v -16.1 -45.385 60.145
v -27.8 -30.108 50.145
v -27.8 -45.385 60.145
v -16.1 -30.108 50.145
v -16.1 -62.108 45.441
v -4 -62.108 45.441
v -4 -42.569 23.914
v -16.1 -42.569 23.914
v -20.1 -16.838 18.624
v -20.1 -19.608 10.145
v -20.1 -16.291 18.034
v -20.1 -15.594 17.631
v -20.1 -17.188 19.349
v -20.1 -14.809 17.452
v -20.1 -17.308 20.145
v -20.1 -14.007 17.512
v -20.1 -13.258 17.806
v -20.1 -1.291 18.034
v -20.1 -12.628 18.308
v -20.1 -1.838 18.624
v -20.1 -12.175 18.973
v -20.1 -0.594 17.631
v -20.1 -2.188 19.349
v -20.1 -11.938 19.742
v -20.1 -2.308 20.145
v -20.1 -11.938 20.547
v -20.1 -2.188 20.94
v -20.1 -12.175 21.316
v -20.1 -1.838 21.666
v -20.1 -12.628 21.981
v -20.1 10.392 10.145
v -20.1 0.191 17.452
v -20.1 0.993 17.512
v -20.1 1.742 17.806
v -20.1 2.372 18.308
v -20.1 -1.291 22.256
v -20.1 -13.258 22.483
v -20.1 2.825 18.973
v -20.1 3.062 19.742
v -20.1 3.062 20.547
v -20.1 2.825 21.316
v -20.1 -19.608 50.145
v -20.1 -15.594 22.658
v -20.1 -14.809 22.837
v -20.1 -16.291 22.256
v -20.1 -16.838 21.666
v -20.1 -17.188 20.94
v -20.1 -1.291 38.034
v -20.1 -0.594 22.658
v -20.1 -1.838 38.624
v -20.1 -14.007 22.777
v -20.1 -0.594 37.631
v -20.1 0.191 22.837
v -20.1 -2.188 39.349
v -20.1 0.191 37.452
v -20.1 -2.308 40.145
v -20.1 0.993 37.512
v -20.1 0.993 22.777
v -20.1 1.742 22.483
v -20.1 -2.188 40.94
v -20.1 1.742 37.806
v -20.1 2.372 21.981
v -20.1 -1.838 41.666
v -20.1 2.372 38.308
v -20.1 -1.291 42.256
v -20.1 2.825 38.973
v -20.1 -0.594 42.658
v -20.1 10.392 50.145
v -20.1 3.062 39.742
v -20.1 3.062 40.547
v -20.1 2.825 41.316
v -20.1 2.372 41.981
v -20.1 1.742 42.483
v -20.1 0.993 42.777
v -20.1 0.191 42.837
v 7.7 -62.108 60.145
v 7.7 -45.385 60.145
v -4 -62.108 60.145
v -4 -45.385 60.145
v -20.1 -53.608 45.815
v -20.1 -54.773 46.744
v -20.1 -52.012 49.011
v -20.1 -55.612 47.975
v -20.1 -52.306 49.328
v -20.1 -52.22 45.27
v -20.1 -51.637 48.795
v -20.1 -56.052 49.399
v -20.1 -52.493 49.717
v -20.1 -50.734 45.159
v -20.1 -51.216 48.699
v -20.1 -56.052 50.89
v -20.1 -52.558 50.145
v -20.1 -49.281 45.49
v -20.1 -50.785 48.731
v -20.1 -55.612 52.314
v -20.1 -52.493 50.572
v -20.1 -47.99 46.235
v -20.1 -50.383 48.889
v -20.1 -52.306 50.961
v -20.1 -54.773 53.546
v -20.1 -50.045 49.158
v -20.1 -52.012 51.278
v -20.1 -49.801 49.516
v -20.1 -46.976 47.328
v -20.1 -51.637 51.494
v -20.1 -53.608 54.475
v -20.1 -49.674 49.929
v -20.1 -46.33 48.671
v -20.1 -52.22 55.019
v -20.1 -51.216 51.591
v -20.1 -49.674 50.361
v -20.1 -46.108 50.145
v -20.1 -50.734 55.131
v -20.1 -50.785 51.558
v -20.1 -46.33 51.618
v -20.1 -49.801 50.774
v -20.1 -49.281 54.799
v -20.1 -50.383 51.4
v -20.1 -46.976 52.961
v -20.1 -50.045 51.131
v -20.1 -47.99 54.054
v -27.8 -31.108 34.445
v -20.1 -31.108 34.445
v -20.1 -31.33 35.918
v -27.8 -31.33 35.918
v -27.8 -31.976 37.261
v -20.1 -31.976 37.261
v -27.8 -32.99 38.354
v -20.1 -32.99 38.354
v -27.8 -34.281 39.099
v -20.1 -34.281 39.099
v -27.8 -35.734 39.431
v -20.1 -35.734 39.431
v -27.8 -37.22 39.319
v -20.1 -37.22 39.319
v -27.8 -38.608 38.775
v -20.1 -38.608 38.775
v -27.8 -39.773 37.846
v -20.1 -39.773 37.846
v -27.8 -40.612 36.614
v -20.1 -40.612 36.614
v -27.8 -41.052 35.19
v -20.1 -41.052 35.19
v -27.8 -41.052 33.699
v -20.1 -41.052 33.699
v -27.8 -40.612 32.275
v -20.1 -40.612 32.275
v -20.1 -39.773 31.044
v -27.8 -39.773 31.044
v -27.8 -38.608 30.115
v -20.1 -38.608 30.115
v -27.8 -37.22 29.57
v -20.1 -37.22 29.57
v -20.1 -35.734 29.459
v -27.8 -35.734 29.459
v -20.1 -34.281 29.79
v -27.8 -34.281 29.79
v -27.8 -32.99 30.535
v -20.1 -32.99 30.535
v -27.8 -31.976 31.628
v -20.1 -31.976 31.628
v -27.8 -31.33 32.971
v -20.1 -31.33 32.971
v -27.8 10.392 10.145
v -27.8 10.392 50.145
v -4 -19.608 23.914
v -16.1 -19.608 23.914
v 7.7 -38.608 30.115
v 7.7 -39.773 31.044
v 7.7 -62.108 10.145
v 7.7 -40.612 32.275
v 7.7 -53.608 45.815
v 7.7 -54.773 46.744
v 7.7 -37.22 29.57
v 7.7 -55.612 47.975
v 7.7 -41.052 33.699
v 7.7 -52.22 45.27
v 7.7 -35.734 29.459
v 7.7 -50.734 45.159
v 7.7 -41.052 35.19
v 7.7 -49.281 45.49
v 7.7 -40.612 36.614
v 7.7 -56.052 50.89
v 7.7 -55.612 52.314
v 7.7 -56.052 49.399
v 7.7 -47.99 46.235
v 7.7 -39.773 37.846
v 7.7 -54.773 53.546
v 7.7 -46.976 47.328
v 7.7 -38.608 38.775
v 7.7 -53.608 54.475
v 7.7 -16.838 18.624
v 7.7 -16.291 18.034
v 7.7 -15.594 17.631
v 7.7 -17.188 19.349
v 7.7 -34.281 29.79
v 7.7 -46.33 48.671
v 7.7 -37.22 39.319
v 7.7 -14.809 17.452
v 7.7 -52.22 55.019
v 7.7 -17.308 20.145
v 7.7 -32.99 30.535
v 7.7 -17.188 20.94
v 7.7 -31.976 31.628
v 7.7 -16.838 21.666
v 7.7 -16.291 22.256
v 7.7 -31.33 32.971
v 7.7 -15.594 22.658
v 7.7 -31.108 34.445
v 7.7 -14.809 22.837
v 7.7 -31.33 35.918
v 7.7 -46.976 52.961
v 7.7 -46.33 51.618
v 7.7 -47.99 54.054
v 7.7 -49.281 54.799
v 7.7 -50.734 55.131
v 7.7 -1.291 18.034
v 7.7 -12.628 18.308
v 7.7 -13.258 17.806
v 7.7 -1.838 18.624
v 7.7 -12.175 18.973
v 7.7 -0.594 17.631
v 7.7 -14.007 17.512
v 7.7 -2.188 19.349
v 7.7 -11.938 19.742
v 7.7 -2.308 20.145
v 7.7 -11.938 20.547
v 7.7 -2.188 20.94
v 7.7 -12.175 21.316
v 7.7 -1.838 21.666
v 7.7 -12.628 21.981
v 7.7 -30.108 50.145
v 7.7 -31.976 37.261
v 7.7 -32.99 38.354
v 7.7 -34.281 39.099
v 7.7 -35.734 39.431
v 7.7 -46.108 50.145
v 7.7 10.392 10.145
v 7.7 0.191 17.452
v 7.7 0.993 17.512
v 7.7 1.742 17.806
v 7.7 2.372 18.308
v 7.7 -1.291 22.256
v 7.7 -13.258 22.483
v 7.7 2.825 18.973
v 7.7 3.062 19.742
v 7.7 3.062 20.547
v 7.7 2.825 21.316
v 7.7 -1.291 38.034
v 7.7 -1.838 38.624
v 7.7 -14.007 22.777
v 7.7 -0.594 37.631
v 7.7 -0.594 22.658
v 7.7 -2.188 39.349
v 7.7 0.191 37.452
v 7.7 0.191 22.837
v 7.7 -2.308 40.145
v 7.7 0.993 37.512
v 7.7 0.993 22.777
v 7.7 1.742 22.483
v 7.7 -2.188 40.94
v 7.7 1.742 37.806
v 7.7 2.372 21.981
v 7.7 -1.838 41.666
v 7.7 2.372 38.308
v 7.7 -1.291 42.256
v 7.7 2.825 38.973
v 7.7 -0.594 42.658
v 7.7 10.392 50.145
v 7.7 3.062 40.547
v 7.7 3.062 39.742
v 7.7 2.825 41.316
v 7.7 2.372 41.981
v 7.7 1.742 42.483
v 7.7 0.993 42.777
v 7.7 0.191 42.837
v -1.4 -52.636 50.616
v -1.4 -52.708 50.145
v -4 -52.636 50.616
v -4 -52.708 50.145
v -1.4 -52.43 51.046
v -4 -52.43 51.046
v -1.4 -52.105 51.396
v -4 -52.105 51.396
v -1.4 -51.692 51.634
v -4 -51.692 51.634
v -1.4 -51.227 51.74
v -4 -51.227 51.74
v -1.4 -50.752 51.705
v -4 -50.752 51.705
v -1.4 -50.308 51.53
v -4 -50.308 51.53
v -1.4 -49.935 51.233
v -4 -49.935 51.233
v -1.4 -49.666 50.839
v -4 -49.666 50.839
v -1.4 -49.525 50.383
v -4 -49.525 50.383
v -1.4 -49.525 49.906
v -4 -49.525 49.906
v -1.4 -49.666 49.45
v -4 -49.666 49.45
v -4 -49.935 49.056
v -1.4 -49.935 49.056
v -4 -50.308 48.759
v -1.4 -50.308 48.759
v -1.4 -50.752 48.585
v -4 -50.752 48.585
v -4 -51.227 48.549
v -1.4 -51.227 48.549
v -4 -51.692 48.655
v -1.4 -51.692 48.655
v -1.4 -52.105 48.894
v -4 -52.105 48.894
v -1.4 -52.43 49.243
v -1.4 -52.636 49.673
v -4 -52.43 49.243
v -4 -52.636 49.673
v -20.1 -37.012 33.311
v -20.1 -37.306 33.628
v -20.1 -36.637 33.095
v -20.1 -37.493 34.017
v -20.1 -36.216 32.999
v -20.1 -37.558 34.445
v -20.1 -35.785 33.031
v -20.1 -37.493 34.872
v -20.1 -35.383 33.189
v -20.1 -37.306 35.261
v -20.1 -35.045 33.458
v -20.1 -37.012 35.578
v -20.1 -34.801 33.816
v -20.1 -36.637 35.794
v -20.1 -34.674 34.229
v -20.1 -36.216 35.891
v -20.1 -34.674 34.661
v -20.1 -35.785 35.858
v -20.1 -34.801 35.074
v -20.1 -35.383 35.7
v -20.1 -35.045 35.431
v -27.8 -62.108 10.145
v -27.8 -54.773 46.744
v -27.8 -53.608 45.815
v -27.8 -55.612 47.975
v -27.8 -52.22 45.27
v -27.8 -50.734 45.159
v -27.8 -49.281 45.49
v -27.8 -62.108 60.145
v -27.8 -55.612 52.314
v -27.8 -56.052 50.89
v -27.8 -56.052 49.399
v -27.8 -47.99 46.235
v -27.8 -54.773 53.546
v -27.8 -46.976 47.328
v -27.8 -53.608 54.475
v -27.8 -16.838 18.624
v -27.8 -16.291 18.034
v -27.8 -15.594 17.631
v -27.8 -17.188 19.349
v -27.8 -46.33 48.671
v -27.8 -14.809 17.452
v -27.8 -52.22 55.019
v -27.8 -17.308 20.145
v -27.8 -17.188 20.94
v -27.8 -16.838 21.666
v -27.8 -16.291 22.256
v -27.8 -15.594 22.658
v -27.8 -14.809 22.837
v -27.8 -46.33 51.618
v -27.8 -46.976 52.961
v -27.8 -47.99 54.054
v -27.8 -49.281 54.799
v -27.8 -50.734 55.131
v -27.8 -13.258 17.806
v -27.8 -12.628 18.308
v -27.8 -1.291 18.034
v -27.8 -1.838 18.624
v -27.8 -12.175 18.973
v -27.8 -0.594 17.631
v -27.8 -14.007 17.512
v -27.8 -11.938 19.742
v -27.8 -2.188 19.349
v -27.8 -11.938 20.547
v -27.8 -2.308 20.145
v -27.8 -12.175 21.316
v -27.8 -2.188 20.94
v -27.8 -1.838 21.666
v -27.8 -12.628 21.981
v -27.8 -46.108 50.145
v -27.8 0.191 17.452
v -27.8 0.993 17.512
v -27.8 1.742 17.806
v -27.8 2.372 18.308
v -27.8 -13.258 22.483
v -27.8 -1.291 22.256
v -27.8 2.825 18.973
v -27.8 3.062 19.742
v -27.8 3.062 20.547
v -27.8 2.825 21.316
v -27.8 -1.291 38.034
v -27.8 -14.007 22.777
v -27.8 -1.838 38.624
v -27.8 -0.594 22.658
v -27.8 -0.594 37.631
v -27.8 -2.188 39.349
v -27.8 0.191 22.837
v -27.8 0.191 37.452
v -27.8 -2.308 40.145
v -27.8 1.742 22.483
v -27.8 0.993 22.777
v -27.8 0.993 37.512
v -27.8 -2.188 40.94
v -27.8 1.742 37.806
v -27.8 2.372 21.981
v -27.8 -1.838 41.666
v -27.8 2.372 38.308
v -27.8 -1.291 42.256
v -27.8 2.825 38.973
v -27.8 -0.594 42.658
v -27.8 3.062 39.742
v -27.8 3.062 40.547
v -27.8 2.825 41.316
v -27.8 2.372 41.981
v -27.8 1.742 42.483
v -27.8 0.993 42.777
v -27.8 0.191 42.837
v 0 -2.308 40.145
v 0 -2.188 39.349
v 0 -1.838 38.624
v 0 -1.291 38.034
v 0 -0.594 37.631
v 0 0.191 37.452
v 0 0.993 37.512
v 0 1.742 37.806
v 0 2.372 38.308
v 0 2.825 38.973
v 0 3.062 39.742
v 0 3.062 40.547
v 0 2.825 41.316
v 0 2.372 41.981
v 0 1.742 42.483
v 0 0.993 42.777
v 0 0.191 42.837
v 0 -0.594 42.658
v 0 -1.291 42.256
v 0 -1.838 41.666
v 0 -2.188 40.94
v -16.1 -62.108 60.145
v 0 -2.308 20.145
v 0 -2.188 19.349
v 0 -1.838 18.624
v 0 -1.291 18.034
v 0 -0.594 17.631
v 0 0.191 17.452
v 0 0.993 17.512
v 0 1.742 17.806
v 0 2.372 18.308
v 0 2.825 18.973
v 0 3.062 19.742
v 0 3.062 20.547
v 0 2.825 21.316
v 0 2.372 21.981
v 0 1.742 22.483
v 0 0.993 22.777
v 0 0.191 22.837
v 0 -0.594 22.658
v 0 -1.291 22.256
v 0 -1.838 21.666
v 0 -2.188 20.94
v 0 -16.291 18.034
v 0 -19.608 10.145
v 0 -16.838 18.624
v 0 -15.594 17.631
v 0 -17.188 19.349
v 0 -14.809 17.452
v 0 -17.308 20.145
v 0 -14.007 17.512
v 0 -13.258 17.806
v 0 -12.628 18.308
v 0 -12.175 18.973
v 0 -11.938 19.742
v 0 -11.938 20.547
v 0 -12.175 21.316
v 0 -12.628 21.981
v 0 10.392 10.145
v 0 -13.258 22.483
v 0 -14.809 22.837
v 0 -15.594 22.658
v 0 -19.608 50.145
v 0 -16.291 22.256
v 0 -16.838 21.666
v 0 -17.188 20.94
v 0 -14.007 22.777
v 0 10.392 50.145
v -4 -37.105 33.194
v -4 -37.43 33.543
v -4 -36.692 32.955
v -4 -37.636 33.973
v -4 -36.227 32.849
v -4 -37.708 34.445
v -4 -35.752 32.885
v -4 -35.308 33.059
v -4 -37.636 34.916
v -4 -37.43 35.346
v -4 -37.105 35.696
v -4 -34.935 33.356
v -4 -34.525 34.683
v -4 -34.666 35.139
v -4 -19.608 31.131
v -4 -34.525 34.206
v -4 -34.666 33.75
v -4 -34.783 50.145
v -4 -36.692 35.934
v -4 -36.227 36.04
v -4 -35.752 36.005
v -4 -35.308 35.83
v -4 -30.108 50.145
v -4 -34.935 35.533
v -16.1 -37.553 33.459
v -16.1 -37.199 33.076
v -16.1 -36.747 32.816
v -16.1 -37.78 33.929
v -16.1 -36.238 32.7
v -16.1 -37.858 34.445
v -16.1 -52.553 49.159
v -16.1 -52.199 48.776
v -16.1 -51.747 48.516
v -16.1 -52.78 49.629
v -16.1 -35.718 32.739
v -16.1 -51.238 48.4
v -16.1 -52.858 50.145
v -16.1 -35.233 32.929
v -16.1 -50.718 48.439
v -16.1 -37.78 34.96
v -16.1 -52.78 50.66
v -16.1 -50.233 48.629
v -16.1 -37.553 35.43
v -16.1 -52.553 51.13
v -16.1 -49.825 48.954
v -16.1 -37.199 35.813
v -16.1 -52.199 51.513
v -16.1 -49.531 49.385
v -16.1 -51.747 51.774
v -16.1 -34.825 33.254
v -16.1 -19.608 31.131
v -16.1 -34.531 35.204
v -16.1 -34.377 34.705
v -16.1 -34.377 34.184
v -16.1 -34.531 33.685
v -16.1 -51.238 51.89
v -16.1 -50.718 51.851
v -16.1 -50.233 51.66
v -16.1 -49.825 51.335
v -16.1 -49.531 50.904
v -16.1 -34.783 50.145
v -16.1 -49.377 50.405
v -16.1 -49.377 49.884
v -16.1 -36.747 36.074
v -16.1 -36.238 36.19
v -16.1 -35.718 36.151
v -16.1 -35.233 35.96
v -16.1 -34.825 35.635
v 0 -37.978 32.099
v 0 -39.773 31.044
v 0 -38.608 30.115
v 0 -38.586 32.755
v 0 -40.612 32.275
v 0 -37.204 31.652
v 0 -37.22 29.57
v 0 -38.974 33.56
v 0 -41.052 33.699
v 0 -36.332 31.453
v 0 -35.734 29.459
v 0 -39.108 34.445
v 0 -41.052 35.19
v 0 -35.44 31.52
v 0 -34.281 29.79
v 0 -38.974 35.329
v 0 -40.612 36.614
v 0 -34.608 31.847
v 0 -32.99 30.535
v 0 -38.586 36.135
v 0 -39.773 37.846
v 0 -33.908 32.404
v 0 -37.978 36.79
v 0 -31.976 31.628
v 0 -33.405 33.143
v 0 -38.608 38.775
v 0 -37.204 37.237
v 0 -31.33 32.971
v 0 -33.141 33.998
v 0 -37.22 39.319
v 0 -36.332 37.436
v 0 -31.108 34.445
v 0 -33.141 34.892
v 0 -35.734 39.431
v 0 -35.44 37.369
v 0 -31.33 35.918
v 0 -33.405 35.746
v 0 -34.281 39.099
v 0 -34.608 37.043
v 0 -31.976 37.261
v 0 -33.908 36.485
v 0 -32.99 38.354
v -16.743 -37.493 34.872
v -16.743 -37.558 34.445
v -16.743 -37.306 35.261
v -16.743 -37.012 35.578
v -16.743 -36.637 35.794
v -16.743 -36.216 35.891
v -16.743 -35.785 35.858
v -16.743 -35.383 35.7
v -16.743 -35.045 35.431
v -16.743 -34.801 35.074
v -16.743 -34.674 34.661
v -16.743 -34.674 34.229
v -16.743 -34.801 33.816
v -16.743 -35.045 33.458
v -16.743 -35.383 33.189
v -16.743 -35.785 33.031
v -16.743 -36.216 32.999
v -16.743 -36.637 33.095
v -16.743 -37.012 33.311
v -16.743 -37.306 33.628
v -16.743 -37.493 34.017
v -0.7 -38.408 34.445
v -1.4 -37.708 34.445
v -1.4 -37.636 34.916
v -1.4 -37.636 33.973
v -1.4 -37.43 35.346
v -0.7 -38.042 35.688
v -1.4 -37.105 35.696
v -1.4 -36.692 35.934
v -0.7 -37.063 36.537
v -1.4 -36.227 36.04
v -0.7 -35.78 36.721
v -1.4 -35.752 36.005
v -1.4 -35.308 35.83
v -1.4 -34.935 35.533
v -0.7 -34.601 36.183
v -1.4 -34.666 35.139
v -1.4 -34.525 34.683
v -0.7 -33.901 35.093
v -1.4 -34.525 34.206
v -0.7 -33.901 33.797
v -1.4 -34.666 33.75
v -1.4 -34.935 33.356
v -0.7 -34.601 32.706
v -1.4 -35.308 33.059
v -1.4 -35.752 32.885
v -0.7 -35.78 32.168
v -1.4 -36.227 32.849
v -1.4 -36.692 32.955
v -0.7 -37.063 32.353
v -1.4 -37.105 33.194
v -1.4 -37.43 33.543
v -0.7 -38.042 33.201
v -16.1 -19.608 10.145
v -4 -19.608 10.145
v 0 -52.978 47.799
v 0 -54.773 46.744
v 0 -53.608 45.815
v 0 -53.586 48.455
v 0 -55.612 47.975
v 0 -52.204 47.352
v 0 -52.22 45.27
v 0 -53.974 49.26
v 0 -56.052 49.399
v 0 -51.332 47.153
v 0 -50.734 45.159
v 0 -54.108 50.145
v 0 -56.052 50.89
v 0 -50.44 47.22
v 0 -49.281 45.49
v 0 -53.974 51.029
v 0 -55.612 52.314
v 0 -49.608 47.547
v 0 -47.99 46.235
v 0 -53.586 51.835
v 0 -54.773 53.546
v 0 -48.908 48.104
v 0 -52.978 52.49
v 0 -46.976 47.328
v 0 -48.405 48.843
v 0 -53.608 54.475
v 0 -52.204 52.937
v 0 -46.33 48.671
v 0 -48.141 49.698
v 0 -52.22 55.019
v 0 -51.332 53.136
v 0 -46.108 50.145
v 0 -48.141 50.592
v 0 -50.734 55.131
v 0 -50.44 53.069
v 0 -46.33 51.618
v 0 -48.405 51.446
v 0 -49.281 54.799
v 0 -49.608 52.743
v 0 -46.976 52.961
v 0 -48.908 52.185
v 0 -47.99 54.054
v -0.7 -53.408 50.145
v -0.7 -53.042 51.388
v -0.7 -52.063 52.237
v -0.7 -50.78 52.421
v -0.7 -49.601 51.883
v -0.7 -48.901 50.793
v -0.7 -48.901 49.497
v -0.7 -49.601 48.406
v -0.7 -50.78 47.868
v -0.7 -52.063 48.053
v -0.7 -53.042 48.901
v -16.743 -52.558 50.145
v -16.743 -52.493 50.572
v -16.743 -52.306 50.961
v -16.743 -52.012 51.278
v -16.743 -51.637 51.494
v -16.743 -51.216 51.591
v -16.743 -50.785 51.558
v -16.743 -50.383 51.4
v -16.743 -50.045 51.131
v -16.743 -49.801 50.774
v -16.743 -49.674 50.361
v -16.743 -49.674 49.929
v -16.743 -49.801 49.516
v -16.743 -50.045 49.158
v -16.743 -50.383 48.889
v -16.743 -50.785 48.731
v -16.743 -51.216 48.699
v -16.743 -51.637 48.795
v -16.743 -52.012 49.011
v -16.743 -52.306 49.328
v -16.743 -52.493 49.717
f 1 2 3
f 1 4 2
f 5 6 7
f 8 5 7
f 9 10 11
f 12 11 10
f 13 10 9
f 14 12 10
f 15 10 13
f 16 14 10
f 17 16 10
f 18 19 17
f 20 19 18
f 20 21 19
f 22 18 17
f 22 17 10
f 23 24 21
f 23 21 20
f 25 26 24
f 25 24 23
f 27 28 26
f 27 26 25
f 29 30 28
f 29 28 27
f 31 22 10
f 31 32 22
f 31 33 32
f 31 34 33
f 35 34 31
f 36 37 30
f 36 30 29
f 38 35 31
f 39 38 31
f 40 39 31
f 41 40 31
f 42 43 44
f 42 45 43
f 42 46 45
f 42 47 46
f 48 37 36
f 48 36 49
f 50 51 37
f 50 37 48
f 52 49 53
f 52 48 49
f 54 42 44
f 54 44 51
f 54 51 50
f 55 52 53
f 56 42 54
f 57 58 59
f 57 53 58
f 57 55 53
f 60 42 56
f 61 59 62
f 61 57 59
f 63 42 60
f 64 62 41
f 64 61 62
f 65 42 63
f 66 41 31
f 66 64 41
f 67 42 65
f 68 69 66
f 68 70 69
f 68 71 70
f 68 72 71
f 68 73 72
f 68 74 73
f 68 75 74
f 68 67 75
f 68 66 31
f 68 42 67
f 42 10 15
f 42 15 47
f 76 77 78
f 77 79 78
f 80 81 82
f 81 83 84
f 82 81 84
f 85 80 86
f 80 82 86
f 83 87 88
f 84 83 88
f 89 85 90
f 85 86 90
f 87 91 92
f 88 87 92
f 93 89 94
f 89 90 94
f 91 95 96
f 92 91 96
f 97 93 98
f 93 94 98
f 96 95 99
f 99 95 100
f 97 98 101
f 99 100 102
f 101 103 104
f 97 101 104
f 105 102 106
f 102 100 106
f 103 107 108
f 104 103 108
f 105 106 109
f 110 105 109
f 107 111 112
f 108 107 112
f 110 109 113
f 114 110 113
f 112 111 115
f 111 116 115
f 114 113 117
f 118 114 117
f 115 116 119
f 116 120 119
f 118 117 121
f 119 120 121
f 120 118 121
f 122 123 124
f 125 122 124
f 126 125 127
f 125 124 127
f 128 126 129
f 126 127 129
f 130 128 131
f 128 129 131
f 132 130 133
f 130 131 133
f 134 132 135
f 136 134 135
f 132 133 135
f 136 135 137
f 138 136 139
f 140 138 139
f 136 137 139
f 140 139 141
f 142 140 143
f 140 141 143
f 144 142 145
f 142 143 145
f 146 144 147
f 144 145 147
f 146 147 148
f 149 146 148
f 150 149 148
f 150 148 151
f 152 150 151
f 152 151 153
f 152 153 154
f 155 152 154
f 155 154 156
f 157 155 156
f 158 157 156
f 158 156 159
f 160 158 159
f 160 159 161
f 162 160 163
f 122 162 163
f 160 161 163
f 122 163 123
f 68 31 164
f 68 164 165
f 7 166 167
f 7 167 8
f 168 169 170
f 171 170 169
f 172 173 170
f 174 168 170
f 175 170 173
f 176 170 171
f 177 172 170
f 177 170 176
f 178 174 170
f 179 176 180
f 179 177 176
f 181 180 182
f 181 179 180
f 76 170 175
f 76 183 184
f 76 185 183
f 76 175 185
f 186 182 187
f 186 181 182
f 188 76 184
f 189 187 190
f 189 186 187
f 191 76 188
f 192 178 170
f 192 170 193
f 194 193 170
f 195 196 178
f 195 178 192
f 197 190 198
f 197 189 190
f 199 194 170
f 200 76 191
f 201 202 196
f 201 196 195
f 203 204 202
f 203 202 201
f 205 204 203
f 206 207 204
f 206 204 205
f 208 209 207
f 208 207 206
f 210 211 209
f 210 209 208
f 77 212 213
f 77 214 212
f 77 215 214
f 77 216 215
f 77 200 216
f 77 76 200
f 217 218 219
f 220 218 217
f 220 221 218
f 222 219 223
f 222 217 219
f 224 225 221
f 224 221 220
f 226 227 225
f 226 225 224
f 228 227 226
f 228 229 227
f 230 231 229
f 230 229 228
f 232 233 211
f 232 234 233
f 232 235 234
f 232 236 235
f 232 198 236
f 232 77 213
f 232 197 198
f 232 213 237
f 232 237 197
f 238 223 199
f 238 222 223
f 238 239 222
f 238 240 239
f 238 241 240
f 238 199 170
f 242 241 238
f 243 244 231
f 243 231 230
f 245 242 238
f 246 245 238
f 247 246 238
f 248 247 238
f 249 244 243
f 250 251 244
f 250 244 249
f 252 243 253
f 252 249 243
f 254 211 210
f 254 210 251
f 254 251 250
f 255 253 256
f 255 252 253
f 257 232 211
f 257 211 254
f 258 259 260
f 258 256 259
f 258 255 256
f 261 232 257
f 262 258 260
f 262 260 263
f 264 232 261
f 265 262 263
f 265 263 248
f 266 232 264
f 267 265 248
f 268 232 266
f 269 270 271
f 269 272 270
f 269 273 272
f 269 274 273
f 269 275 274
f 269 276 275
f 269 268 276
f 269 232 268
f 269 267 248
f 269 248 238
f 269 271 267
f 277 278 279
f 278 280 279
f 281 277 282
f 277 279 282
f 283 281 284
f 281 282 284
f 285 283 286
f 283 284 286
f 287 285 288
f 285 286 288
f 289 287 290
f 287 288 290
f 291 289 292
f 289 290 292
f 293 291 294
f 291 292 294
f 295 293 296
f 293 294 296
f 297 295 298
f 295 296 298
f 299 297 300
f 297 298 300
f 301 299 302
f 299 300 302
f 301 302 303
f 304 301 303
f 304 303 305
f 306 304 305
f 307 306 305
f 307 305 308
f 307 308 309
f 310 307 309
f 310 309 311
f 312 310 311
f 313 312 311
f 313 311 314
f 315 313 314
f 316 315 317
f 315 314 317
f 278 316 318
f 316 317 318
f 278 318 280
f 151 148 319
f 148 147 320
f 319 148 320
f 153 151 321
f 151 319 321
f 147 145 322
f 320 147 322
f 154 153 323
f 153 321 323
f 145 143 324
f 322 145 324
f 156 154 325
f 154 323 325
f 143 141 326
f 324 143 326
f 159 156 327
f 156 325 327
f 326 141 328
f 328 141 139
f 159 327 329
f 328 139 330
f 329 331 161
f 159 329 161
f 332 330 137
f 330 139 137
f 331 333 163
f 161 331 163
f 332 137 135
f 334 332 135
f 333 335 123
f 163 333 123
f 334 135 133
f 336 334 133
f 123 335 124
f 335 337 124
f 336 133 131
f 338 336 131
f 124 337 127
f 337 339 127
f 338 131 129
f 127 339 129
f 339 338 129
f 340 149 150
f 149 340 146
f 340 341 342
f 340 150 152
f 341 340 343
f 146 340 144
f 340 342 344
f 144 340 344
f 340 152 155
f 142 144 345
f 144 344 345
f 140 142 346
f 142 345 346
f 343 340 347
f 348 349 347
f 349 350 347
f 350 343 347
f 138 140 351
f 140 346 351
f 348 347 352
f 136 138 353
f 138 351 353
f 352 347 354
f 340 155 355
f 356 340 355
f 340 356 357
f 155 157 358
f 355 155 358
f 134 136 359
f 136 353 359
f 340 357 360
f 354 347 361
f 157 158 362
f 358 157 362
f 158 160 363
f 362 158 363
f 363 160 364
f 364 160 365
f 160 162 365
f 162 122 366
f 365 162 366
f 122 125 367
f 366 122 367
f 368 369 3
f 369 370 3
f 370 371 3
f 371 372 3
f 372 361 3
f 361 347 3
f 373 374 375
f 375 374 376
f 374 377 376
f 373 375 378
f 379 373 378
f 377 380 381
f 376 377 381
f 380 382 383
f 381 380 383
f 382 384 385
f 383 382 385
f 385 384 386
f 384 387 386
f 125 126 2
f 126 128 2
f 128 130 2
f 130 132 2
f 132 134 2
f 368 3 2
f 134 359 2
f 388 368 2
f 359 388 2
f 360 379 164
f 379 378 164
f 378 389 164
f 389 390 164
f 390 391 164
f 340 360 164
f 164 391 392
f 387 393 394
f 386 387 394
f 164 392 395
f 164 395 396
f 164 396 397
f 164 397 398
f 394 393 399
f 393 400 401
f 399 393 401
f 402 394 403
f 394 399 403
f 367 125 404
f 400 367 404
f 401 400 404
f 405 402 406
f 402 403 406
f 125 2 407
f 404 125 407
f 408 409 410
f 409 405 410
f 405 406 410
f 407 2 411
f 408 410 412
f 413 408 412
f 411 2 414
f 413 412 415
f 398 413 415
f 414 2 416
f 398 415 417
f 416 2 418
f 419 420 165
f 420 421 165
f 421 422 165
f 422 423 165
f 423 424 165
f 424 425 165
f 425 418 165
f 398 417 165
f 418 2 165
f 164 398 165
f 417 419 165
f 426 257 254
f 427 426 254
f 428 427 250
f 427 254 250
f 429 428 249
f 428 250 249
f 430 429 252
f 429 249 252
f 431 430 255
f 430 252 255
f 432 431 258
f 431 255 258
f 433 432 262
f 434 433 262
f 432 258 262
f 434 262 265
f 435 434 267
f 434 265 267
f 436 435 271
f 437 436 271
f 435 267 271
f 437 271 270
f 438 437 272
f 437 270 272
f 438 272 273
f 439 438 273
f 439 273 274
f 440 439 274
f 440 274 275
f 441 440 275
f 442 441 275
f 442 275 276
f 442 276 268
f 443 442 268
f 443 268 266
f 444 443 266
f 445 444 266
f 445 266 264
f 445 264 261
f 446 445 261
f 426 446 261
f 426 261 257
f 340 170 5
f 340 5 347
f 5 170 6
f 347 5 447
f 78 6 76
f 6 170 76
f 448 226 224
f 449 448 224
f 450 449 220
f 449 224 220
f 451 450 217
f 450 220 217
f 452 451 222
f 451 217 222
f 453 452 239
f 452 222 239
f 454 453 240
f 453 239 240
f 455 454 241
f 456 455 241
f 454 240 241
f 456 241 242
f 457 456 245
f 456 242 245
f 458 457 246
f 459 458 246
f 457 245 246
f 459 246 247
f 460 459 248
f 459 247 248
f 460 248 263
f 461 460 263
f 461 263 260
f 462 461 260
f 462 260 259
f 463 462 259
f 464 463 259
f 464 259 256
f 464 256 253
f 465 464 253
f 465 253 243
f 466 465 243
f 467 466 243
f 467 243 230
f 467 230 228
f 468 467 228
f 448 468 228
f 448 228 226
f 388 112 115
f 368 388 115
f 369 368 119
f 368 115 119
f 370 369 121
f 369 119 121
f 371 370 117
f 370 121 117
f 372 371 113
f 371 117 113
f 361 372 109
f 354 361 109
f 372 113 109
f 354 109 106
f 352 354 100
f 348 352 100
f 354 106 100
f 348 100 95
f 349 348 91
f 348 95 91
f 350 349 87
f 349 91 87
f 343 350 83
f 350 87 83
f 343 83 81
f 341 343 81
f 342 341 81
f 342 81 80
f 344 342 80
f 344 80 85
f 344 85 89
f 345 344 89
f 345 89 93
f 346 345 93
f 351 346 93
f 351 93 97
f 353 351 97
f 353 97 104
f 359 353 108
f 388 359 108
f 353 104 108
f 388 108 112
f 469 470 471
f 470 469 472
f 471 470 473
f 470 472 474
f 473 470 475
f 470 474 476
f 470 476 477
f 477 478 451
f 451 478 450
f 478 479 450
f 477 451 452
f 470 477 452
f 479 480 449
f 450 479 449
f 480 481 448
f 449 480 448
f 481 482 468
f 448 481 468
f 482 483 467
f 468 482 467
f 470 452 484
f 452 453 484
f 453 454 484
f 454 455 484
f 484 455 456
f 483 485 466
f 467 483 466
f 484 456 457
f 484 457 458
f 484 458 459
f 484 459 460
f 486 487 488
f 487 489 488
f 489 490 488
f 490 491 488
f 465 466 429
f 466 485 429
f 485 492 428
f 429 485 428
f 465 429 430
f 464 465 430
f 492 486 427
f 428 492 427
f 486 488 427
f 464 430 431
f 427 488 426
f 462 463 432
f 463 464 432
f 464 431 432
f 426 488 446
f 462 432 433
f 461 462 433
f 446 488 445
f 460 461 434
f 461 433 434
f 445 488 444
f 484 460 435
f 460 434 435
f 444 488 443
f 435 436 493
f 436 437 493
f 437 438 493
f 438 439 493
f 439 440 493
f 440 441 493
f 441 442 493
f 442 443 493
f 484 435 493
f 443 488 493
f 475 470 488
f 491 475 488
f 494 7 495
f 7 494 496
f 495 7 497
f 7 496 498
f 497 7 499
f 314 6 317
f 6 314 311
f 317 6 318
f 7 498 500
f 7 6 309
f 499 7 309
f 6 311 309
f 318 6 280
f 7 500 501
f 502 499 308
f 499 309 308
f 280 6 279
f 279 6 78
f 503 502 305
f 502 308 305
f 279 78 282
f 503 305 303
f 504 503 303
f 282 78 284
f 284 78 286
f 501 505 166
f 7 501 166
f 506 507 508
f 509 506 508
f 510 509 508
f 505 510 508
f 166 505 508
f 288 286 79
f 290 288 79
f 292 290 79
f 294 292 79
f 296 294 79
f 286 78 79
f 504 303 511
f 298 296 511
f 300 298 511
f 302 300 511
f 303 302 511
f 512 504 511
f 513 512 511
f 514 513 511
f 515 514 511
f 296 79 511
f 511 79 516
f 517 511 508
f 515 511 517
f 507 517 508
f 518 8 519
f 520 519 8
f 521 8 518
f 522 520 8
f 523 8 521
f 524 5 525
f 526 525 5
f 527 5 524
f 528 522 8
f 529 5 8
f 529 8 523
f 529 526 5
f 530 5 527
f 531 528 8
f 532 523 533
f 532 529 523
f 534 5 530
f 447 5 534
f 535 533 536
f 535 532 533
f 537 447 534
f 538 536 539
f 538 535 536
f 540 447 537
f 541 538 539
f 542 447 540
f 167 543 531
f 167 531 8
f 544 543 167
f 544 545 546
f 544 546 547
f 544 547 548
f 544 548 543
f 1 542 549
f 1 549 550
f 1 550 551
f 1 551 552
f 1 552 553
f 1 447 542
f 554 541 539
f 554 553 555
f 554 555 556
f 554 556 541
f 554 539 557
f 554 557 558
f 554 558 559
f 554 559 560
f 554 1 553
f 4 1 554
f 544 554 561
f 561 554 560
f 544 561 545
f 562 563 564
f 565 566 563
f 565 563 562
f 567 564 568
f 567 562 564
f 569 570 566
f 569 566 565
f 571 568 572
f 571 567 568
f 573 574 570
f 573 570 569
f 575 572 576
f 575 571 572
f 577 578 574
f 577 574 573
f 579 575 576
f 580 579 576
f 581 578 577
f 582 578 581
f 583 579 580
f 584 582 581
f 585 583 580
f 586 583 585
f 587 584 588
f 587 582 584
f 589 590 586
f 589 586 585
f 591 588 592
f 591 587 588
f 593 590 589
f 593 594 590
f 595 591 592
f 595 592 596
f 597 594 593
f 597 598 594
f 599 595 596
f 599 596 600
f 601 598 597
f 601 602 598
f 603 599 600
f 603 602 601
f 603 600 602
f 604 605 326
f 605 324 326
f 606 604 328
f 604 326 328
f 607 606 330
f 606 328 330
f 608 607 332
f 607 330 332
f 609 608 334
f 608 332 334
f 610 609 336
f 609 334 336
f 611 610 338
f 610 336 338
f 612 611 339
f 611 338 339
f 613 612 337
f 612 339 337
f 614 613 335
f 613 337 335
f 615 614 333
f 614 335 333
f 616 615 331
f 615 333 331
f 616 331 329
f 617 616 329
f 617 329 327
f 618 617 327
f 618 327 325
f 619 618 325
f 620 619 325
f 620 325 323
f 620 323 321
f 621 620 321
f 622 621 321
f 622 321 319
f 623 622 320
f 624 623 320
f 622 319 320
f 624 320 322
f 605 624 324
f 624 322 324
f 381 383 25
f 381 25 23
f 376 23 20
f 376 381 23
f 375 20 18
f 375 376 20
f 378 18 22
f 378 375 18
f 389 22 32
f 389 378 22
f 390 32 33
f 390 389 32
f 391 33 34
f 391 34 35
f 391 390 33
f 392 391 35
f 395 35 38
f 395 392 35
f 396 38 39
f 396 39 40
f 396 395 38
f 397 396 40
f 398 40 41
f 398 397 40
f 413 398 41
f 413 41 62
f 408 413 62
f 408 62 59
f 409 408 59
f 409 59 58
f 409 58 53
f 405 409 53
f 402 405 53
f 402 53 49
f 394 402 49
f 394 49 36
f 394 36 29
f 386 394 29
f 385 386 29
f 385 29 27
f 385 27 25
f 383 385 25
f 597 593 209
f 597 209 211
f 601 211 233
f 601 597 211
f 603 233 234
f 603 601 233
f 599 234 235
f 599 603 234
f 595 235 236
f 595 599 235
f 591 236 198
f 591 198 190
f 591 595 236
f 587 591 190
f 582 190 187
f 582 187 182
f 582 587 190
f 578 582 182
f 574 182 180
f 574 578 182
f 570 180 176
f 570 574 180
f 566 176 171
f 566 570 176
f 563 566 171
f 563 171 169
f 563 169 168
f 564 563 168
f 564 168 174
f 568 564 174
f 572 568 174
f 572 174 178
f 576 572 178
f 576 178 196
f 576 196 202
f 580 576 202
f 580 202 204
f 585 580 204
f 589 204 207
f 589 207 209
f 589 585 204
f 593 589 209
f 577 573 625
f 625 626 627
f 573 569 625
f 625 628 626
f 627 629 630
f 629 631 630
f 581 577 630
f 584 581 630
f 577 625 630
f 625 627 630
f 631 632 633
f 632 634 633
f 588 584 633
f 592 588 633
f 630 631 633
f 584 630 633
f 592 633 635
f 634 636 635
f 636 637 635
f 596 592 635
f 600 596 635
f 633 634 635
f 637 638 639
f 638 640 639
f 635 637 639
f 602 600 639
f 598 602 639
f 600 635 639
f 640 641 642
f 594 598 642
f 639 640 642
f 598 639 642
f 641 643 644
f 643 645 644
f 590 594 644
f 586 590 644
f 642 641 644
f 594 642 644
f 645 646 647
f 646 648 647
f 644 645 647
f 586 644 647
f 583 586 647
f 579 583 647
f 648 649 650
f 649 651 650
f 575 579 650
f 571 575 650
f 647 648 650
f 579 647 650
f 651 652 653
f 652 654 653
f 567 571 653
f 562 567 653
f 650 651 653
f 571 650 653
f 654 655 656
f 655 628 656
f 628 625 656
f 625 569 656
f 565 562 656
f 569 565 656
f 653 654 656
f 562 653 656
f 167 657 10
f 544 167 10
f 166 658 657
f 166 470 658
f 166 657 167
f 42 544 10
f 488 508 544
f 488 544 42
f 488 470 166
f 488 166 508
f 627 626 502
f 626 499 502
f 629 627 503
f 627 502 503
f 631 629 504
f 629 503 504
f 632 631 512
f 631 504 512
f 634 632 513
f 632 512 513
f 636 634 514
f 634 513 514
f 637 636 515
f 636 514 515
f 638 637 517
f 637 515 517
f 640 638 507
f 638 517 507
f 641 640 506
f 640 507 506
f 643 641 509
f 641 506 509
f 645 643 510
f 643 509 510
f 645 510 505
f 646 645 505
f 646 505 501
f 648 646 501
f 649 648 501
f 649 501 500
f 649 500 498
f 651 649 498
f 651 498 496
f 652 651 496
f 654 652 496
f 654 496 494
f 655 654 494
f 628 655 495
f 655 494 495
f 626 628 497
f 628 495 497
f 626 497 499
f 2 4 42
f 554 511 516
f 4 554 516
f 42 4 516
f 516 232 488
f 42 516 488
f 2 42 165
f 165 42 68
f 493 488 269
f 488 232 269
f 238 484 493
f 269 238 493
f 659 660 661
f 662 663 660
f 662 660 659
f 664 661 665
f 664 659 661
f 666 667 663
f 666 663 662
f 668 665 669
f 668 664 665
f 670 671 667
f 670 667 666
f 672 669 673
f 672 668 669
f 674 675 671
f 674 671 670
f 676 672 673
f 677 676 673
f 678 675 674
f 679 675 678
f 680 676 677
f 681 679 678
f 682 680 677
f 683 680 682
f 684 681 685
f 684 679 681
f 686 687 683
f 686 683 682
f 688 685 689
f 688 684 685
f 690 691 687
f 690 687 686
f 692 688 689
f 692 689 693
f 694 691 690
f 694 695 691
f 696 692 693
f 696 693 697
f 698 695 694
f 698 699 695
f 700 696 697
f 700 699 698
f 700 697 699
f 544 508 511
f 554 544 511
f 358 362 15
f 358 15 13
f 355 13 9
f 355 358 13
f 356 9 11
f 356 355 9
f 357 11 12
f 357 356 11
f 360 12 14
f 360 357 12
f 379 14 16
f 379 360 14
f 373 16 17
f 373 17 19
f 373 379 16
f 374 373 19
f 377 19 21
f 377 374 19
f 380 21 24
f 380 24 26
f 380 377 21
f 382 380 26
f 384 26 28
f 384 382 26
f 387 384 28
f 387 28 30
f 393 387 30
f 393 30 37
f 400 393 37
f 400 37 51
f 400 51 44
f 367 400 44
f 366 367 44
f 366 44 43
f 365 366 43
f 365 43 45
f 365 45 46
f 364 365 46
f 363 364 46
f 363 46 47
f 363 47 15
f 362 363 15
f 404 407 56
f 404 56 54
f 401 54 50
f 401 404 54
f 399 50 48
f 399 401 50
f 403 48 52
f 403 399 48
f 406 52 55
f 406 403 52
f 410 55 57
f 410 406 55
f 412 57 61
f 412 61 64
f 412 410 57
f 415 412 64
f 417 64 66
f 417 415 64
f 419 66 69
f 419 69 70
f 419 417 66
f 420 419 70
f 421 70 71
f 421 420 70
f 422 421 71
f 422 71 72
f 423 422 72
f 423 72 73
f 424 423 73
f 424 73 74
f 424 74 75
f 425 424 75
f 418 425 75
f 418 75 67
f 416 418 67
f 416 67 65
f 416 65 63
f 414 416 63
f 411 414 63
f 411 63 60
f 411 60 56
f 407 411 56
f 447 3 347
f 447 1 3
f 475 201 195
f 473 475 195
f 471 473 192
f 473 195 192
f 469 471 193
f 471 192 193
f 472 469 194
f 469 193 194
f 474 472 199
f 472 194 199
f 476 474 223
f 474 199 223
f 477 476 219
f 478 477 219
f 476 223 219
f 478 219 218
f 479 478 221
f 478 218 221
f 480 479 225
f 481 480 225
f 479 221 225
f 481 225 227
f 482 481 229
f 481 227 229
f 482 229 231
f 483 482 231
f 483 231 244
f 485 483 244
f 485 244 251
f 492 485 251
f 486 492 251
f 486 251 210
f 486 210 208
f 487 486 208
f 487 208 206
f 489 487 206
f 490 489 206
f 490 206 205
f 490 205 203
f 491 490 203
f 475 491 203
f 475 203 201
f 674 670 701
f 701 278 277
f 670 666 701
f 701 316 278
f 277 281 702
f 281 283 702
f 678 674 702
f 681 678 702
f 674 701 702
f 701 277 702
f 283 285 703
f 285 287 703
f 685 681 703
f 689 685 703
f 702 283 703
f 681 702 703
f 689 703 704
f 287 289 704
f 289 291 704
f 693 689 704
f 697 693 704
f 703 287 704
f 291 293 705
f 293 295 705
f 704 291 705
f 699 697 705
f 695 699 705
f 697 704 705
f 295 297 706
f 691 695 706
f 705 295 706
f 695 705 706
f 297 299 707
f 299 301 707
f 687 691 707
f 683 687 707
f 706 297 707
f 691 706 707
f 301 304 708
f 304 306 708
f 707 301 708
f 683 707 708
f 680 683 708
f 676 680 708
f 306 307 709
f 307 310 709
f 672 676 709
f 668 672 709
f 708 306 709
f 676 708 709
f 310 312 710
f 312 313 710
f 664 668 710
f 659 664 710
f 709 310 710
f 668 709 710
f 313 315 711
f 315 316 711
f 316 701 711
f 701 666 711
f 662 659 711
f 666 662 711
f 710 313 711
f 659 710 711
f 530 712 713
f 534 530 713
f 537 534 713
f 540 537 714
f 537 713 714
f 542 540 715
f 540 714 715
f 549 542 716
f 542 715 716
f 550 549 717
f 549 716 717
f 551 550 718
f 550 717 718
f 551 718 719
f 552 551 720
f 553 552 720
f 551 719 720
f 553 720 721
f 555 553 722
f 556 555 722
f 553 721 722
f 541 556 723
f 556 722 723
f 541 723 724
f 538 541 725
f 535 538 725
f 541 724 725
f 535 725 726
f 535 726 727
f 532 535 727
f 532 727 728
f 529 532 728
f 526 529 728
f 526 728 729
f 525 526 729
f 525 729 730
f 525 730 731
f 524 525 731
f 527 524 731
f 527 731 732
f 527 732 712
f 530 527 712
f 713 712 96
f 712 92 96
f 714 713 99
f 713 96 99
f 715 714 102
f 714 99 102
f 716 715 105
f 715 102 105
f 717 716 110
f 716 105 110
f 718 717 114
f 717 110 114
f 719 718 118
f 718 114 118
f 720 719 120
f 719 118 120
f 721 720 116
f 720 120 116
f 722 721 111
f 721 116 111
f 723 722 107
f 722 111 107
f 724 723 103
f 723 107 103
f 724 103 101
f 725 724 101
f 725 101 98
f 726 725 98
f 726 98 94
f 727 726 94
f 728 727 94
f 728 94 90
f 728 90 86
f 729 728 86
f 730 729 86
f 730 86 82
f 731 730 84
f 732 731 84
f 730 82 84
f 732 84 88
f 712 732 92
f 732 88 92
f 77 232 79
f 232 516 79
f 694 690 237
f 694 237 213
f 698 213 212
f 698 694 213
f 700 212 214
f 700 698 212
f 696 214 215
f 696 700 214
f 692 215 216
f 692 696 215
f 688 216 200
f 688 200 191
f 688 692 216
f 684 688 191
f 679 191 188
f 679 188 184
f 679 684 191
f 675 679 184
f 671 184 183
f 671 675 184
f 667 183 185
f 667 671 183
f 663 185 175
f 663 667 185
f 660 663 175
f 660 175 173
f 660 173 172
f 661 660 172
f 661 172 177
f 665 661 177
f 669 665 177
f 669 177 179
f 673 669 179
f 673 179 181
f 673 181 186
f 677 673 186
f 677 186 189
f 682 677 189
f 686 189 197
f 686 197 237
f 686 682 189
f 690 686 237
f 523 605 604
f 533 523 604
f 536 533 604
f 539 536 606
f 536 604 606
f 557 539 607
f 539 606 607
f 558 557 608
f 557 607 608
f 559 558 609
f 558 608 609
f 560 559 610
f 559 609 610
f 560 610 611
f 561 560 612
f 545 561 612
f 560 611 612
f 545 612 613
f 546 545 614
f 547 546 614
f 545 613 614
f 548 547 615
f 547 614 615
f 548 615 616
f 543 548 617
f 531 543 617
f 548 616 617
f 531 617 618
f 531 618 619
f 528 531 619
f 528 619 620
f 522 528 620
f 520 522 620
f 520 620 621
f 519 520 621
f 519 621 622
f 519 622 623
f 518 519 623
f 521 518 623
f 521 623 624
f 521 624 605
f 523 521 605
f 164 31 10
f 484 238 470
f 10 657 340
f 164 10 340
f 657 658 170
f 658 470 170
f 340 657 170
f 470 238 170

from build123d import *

# Parameters (mm, degrees)
F2_R            = 5
F3_DEPTH        = 4
F2_W            = 30
F2_H            = 40
F4_DEPTH        = 7.7
F5_D            = 5.4
F9_D            = 3.2
F9_CSINK_D      = 6
F9_CSINK_ANGLE  = 90
F11_D           = 2.9
F11_CSINK_D     = 3.5
F11_CSINK_ANGLE = 50
F12_W           = 22.961332947
F12_H           = 13.7697942555
F13_DEPTH       = 12.1


with BuildPart() as f3:
    # F2 (on Right) → F3 (new body)
    with BuildSketch(Plane.YZ):
        Polygon((-62.1075481176, 10.1446546614), (-19.6075481176, 10.1446546614), (-19.6075481176, 50.1446546614), (-30.1075481176, 50.1446546614), (-45.3845150769, 60.1446546614), (-62.1075481176, 60.1446546614), (-62.1075481176, 50.1446546614), align=None)
        with Locations((-36.1075481176, 34.4446546614)):
            Circle(F2_R, mode=Mode.SUBTRACT)
        with Locations((-51.1075481176, 50.1446546614)):
            Circle(F2_R, mode=Mode.SUBTRACT)
        with Locations((-51.1075481176, 50.1446546614)):
            Circle(F2_R)
        with Locations((-36.1075481176, 34.4446546614)):
            Circle(F2_R)
    extrude(amount=-F3_DEPTH)

    # F2 (on Right) → F4 (join)
    with BuildSketch(Plane.YZ):
        with Locations((-4.6075481176, 30.1446546614)):
            Rectangle(F2_W, F2_H)
        Polygon((-62.1075481176, 10.1446546614), (-19.6075481176, 10.1446546614), (-19.6075481176, 50.1446546614), (-30.1075481176, 50.1446546614), (-45.3845150769, 60.1446546614), (-62.1075481176, 60.1446546614), (-62.1075481176, 50.1446546614), align=None)
        with Locations((-36.1075481176, 34.4446546614)):
            Circle(F2_R, mode=Mode.SUBTRACT)
        with Locations((-51.1075481176, 50.1446546614)):
            Circle(F2_R, mode=Mode.SUBTRACT)
    extrude(amount=F4_DEPTH)

    # F5 (through all)
    with Locations(Plane(origin=(0, 0, 0), x_dir=(0, 1, 0), z_dir=(-1, 0, 0))):
        with Locations((0.3924518824, -40.1446546614), (0.3924518824, -20.1446546614), (-14.6075481176, -20.1446546614)):
            Hole(F5_D / 2)


with BuildPart() as f8_1:
    # F8: instance of F3
    add(f3.part.mirror(Plane.YZ.offset(-10.05)))

    # F11 (through all)
    with Locations(Plane.YZ.offset(-16.1)):
        with Locations((-36.1075481176, 34.4446546614), (-51.1075481176, 50.1446546614)):
            CounterSinkHole(F11_D / 2, F11_CSINK_D / 2, counter_sink_angle=F11_CSINK_ANGLE)


with BuildPart() as f3_1:
    add(f3.part)

    # F9 (through all)
    with Locations(Plane.YZ):
        with Locations((-51.1075481176, 50.1446546614), (-36.1075481176, 34.4446546614)):
            CounterSinkHole(F9_D / 2, F9_CSINK_D / 2, counter_sink_angle=F9_CSINK_ANGLE)

    add(f8_1.part)  # F13 merges F8_1
    # F12 (on face) → F13 (join, through all)
    with BuildSketch(Plane(origin=(-4, 0, 0), x_dir=(0, -1, 0), z_dir=(-1, 0, 0))):
        Polygon((62.1075481176, 10.1446546614), (62.1075481176, 45.4412288964), (42.5688810647, 23.9144489169), (42.5688810647, 10.1446546614), align=None)
        with Locations((31.0882145911, 17.0295517892)):
            Rectangle(F12_W, F12_H)
        Polygon((19.6075481176, 50.1446546614), (19.6075481176, 31.1306696385), (34.7832851112, 50.1446546614), (30.1075481176, 50.1446546614), align=None)
    extrude(amount=F13_DEPTH)


solid = f3_1.part
